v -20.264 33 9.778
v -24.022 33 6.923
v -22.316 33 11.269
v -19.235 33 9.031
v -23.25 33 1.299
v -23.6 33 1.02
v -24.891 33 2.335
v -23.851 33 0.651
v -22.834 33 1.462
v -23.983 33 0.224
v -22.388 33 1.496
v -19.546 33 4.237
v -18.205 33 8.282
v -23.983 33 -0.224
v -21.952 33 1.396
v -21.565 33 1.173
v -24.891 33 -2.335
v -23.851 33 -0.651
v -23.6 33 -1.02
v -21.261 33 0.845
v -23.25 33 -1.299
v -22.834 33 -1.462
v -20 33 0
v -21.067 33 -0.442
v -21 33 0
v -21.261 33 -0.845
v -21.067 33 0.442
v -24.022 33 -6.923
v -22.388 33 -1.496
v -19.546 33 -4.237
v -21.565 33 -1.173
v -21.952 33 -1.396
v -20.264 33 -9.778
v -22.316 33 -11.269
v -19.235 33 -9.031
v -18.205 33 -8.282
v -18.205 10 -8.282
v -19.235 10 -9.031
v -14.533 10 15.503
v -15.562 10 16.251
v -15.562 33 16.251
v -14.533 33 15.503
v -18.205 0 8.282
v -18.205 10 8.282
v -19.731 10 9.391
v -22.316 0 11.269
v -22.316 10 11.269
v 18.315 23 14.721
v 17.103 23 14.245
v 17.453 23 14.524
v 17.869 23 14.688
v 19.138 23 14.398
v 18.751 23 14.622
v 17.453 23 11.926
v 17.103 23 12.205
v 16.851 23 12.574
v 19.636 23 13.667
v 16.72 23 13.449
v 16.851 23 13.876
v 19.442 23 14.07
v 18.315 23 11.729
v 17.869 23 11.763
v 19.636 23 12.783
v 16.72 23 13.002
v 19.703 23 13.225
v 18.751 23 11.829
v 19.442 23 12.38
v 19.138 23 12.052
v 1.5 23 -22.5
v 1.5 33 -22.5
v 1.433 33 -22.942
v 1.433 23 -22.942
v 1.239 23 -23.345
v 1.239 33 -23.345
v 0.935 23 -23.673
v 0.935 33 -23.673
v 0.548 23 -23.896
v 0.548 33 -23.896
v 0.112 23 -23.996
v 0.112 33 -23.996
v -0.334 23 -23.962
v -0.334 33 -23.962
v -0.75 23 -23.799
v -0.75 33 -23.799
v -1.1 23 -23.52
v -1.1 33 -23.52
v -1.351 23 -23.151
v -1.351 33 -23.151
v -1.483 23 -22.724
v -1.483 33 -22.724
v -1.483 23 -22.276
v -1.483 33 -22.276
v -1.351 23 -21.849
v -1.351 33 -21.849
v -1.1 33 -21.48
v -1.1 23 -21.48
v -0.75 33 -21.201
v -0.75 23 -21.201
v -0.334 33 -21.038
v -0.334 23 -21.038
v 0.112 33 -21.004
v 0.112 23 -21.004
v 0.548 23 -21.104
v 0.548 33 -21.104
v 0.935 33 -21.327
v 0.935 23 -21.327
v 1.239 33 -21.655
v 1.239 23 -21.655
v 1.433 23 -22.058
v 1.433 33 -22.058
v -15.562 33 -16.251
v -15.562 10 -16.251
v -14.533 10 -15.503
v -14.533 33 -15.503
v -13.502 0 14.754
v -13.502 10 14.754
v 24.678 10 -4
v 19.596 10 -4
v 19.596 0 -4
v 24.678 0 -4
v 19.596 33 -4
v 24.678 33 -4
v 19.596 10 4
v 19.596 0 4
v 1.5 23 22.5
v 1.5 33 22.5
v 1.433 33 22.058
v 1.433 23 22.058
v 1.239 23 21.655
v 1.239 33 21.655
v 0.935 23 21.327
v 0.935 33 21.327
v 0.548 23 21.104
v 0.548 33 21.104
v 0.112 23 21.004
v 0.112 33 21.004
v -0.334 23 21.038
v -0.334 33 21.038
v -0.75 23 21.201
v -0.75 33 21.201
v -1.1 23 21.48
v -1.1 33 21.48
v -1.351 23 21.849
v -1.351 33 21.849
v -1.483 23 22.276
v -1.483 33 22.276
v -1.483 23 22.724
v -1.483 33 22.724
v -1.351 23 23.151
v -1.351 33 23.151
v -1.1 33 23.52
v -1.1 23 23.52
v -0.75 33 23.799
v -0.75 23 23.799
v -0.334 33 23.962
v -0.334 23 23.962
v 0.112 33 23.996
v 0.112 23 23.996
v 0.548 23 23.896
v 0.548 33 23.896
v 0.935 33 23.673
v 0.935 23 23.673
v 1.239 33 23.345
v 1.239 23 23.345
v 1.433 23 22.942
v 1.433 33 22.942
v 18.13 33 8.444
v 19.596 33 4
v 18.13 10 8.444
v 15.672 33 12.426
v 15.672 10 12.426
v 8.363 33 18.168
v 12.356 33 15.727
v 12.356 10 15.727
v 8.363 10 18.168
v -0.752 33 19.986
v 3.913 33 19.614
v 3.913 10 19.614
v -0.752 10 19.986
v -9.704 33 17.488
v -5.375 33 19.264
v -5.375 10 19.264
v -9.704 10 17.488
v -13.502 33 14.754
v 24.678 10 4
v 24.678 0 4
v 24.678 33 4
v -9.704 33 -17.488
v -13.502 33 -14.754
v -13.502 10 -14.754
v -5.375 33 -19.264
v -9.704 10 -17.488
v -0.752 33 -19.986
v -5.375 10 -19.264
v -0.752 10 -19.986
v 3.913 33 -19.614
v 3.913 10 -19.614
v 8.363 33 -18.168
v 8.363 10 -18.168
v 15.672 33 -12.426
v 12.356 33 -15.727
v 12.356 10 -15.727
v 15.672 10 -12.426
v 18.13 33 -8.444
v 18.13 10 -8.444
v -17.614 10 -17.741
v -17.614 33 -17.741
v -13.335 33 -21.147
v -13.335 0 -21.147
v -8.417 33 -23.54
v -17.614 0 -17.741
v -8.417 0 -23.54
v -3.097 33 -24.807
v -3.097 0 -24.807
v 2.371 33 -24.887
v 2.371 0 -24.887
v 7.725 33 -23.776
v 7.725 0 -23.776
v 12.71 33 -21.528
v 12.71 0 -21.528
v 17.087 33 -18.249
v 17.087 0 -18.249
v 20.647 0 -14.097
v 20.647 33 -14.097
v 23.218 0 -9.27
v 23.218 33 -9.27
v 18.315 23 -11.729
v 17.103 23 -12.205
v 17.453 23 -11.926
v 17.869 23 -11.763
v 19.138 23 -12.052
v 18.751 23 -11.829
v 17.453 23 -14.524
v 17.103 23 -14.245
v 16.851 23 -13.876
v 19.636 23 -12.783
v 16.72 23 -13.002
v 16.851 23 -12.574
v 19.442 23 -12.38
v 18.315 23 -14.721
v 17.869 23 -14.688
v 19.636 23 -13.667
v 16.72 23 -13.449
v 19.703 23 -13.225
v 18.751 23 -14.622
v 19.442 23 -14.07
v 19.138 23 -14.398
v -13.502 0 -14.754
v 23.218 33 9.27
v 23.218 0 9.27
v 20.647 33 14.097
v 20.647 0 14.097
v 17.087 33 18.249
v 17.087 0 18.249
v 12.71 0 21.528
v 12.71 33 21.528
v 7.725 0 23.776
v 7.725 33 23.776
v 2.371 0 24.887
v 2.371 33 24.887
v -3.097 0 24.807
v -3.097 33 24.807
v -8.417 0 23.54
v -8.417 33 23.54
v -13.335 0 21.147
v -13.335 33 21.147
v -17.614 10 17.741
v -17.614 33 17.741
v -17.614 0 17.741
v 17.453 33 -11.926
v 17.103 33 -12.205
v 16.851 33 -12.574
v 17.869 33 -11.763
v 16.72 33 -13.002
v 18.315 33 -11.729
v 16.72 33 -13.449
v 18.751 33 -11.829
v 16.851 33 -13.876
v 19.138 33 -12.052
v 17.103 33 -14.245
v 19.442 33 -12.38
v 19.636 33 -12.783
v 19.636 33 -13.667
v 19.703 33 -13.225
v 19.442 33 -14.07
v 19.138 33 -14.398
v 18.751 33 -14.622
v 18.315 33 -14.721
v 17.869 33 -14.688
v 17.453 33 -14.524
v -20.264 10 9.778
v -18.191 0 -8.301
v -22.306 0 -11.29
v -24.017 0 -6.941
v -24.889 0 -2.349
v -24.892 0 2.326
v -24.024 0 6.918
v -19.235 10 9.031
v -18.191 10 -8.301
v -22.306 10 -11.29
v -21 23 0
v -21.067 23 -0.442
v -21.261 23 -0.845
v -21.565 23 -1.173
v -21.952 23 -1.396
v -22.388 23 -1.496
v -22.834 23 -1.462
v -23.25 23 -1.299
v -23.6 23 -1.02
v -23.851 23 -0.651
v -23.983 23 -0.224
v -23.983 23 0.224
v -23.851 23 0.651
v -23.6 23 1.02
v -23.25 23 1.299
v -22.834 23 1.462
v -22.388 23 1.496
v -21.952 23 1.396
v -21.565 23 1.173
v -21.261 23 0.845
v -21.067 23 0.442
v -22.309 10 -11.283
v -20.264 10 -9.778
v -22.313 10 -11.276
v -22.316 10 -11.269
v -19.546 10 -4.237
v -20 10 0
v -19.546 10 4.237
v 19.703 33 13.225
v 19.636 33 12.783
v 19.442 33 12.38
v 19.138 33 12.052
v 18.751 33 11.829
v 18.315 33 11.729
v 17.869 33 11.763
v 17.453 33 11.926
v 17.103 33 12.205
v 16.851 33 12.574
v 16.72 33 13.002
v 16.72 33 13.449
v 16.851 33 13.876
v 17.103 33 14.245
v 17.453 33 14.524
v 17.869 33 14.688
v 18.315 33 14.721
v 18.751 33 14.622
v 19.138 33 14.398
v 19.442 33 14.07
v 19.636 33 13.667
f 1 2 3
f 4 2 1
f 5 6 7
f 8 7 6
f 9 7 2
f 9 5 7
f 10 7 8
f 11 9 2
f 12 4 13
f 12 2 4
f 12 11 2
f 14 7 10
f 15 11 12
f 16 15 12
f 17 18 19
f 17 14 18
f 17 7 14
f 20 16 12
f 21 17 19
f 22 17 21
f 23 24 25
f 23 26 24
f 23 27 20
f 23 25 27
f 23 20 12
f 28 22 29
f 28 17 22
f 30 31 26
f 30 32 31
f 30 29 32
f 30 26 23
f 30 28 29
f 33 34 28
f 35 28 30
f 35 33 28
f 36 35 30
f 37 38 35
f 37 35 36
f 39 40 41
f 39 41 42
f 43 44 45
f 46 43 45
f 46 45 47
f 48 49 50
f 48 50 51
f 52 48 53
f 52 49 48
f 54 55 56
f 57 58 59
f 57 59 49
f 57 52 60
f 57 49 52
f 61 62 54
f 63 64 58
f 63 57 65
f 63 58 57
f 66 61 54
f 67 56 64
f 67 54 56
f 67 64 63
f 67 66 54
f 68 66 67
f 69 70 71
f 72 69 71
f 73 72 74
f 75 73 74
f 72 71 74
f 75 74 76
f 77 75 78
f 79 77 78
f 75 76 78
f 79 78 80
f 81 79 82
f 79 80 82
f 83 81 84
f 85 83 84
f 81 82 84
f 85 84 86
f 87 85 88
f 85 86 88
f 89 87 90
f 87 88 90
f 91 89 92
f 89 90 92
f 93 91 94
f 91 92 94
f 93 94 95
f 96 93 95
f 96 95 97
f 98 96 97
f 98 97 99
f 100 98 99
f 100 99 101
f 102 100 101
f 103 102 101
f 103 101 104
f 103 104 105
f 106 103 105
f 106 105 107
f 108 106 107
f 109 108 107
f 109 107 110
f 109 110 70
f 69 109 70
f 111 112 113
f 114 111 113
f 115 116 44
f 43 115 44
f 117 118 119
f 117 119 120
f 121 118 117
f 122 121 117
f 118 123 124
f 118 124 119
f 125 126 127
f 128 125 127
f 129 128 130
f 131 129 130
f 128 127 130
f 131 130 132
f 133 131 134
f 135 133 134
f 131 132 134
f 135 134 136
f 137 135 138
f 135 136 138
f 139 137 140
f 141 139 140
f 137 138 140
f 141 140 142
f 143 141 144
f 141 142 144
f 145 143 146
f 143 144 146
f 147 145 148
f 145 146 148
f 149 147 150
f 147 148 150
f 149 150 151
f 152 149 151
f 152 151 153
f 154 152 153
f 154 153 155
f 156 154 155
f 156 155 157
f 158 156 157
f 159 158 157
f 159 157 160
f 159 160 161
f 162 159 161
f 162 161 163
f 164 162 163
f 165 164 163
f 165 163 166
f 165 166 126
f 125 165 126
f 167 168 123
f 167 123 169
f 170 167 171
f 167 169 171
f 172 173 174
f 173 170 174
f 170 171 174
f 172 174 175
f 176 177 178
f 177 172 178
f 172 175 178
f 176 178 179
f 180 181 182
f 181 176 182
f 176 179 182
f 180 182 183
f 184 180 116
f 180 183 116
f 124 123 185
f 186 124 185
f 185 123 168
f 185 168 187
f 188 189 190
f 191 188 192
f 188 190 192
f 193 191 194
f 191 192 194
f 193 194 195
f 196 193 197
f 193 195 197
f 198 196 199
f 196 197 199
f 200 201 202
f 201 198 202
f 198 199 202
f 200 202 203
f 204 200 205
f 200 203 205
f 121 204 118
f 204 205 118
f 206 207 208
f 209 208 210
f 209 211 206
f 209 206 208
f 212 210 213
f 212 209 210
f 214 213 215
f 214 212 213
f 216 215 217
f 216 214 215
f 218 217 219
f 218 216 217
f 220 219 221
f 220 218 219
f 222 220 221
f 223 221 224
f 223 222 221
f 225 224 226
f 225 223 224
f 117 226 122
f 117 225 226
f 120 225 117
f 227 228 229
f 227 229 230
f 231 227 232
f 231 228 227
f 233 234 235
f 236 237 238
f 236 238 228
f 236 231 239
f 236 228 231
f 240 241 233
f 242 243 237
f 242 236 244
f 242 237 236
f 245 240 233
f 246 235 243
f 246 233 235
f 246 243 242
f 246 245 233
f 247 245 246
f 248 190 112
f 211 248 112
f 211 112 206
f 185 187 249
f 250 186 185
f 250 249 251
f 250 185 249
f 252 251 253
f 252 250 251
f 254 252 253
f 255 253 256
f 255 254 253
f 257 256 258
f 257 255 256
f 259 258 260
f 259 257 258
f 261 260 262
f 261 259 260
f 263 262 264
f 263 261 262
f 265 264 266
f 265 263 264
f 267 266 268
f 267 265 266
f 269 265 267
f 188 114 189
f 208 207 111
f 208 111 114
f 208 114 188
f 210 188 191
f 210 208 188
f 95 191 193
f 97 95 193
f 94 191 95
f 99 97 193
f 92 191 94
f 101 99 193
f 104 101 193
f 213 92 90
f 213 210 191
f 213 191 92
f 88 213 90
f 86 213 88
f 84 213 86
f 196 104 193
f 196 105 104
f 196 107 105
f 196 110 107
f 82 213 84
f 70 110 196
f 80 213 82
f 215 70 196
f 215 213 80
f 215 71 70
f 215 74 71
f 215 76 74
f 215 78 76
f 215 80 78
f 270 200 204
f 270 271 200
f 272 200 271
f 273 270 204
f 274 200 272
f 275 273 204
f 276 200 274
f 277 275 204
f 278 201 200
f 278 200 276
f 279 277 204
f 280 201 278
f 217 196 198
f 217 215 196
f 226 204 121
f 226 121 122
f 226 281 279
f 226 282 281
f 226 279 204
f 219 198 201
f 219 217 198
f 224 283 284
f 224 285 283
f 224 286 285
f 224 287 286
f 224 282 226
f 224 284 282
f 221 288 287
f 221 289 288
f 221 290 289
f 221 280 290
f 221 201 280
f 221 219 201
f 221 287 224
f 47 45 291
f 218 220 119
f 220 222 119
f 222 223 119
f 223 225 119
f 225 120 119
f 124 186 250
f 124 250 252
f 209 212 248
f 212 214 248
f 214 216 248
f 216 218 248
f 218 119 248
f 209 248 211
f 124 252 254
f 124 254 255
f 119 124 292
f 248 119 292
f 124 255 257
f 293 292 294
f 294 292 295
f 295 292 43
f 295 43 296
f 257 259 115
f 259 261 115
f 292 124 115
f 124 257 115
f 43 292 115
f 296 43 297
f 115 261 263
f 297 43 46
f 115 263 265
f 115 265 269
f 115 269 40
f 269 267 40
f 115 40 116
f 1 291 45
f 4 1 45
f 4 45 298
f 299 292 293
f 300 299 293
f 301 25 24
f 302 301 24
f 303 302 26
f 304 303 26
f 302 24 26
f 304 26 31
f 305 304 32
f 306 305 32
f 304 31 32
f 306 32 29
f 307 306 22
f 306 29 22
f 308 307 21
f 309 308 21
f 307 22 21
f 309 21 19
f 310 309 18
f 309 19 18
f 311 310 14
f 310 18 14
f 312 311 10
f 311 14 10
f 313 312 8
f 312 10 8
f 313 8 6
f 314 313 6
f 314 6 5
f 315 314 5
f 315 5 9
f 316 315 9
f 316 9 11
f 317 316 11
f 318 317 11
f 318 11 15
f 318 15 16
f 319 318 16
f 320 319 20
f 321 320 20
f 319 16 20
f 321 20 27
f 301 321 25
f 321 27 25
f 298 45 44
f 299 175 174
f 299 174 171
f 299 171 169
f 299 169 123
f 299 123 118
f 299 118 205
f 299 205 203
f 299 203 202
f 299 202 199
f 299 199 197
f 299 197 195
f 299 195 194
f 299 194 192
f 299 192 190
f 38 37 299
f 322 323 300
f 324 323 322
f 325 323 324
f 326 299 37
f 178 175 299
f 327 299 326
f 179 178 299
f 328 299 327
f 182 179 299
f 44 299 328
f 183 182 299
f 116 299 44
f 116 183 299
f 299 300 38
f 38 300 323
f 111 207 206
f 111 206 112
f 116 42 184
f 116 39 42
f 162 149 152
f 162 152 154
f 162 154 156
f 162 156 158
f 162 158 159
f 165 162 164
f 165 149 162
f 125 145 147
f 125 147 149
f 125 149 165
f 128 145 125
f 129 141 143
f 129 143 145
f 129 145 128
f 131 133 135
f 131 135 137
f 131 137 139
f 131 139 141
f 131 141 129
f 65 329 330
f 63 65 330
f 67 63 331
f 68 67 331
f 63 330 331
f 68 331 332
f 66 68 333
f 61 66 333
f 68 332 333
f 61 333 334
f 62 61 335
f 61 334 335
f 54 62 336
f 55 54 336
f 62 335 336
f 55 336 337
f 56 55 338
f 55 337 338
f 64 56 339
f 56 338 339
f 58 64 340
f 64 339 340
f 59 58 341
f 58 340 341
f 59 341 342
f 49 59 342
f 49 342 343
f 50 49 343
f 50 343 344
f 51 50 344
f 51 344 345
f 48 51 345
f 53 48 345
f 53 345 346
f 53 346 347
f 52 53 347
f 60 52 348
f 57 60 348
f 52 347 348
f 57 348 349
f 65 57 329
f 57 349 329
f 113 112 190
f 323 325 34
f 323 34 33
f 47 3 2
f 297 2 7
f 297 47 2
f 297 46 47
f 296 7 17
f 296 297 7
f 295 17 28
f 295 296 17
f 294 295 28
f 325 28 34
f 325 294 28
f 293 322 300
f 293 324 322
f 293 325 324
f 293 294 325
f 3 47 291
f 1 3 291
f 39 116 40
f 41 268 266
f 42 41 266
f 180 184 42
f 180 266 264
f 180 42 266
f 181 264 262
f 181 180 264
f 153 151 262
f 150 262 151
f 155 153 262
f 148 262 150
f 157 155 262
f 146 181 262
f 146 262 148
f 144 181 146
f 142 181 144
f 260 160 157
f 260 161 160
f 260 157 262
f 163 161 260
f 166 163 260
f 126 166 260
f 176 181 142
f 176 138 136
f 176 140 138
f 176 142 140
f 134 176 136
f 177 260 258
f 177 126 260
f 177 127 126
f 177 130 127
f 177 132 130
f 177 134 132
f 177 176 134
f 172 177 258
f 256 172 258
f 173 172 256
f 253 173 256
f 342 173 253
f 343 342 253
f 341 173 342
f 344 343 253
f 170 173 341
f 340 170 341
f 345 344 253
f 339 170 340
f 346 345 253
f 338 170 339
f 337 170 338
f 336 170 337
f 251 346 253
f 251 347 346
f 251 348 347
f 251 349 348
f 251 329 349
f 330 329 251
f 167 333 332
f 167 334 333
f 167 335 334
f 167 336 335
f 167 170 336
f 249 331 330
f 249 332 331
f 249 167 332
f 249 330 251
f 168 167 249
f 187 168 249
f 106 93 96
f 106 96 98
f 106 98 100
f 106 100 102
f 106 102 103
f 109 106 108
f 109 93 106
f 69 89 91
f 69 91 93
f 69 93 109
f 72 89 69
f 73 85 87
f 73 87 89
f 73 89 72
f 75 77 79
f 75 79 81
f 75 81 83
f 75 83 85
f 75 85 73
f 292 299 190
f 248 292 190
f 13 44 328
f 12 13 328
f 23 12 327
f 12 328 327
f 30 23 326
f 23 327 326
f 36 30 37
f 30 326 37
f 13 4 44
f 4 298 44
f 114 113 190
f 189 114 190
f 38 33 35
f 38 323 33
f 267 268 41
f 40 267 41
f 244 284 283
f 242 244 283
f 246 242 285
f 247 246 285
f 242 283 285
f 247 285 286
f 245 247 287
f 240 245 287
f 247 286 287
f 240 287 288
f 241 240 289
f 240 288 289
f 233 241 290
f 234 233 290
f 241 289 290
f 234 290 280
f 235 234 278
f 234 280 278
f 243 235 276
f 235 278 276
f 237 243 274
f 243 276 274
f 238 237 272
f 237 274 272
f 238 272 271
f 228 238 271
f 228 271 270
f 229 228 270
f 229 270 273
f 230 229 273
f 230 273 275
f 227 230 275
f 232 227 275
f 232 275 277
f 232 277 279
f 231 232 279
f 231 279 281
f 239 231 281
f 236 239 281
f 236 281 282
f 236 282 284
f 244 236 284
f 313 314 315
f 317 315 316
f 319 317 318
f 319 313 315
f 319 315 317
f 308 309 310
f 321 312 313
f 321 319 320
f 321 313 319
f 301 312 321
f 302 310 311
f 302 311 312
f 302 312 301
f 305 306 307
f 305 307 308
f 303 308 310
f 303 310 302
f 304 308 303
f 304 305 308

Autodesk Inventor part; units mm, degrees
ref_plane "YZ Plane" through (0, 0, 0) normal (1, 0, 0) x (0, 1, 0)
ref_plane "XZ Plane" through (0, 0, 0) normal (0, 1, 0) x (-1, 0, 0)
ref_plane "XY Plane" through (0, 0, 0) normal (0, 0, 1) x (1, 0, 0)
sketch "Sketch1" plane through (0, 0, 0) normal (0, 1, 0) x (-1, 0, 0)
  line L0 (0, 0) -> (50, 0) construction
  line L1 (0, 0) -> (50, 0) construction
  line L2 (34.573, 37.4794) -> (12.6591, 21.558)
  line L3 (46.3287, 21.2991) -> (24.4148, 5.3777)
  line L4 (46.3287, -21.2991) -> (24.4148, -5.3777)
  line L5 (34.573, -37.4794) -> (12.6591, -21.558)
  line L6 (-50, -10) -> (-22.9129, -10)
  line L7 (56.6312, -41.145) -> (50.7533, -49.2351)
  line L8 (50.7533, -49.2351) -> (62.509, -33.0548)
  line L9 (62.509, -33.0548) -> (46.3287, -21.2991)
  line L10 (50.7533, -49.2351) -> (34.573, -37.4794)
  line L11 (46.3287, 21.2991) -> (62.509, 33.0548)
  line L12 (62.509, 33.0548) -> (50.7533, 49.2351)
  line L13 (50.7533, 49.2351) -> (34.573, 37.4794)
  line L14 (-50, 10) -> (-70, 10)
  line L15 (-70, 10) -> (-70, -10)
  line L16 (-70, -10) -> (-50, -10)
  line L17 (0, 0) -> (-36, 0)
  circle A0 centre (0, 0) radius 25
  line L18 (-22.9129, 10) -> (-50, 10)
  dimension "d52" = 10
  dimension "d53" = 20
  dimension "d67" = 36
  dimension "d68" = 50
extrude "Extrusion1" add sketch "Sketch1" along normal blind 10
sketch "Sketch8" plane through (-62.509, 0, -33.0548) normal (-0.809, 0, -0.5878) x (-0.5878, 0, 0.809)
  line L0 (-10, 3) -> (-14, 3)
  line L1 (-17, 3) -> (-14, 3)
  line L2 (-3, 3) -> (-3, 7)
  line L3 (-3, 7) -> (-6, 7)
  line L4 (-17, 7) -> (-17, 3)
  line L5 (-10, 0) -> (-6, 0)
  line L6 (14.8816, 0) -> (-15.3777, 0) projected
  line L7 (-6, 0) -> (-6, 3)
  line L8 (-6, 7) -> (-6, 10)
  line L9 (14.8816, 10) -> (-15.3777, 10) projected
  line L10 (-6, 10) -> (-14, 10)
  line L11 (-14, 10) -> (-14, 7)
  line L12 (-14, 3) -> (-14, 0)
  line L13 (-14, 3) -> (-17, 3)
  line L14 (-6, 3) -> (-3, 3)
  line L15 (-14, 7) -> (-17, 7)
  point P0 (-14, 10)
  point P1 (-14, 0)
  dimension "d85" = 3
  dimension "d86" = 7
  dimension "d87" = 14
  dimension "d88" = 4
  dimension "d89" = 4
  dimension "d90" = 8
extrude "Extrusion7" cut sketch "Sketch8" against normal blind 38
sketch "Sketch9" plane through (-50.7533, 0, 49.2351) normal (-0.809, 0, 0.5878) x (0.5878, 0, 0.809)
  line L0 (-10, 3) -> (-14, 3)
  line L1 (-17, 3) -> (-14, 3)
  line L2 (-3, 3) -> (-3, 7)
  line L3 (-3, 7) -> (-6, 7)
  line L4 (-17, 7) -> (-17, 3)
  line L5 (-10, 0) -> (-6, 0)
  line L6 (-6, 0) -> (-6, 3)
  line L7 (-6, 7) -> (-6, 10)
  line L8 (-6, 10) -> (-14, 10)
  line L9 (-14, 10) -> (-14, 7)
  line L10 (-14, 3) -> (-14, 0)
  line L11 (-14, 3) -> (-17, 3)
  line L12 (-6, 3) -> (-3, 3)
  line L13 (-14, 7) -> (-17, 7)
  line L14 (-14, 0) -> (-6, 0)
  line L15 (-6, 3) -> (-3, 3)
  line L16 (-3, 7) -> (-6, 7)
  line L17 (-6, 10) -> (-14, 10)
  line L18 (-4.6223, 10) -> (-34.8816, 10) projected
  line L19 (-14, 10) -> (-14, 7)
  line L20 (-17, 7) -> (-14, 7)
  line L21 (-17, 7) -> (-17, 3)
  line L22 (-14, 3) -> (-17, 3)
  line L23 (-14, 3) -> (-14, 0)
  line L24 (-4.6223, 0) -> (-34.8816, 0) projected
  line L25 (-3, 3) -> (-3, 7)
  line L26 (-6, 7) -> (-6, 10)
  line L27 (-6, 3) -> (-6, 0)
  point P0 (-10, 0)
  point P1 (-15.3777, 0)
  point P2 (-15.3777, 10)
  point P3 (-10, 0)
  dimension "d93" = 3
  dimension "d94" = 7
  dimension "d95" = 14
  dimension "d96" = 4
  dimension "d97" = 4
  dimension "d98" = 8
extrude "Extrusion8" cut sketch "Sketch9" against normal blind 38
sketch "Sketch10" plane through (70, 0, 10) normal (1, 0, 0) x (0, 0, -1)
  line L0 (10, 0) -> (10, 3)
  line L1 (10, 3) -> (17, 3)
  line L2 (17, 3) -> (3, 3)
  line L3 (3, 3) -> (6, 3)
  line L4 (6, 3) -> (6, 0)
  line L5 (0, 0) -> (20, 0) projected
  line L6 (6, 0) -> (14, 0)
  line L7 (14, 0) -> (14, 3)
  line L8 (17, 3) -> (17, 7)
  line L9 (17, 7) -> (3, 7)
  line L10 (3, 7) -> (3, 3)
  line L11 (14, 7) -> (14, 10)
  line L12 (0, 10) -> (20, 10) projected
  line L13 (6, 10) -> (14, 10)
  line L14 (6, 10) -> (6, 7)
  dimension "d101" = 3
  dimension "d102" = 7
  dimension "d103" = 14
  dimension "d104" = 3
  dimension "d105" = 8
  dimension "d106" = 4
extrude "Extrusion9" cut sketch "Sketch10" against normal blind 38
sketch "Sketch12" plane through (70, 0, 10) normal (1, 0, 0) x (0, 0, -1)
  line L0 (20, 10) -> (0, 10) projected
  line L1 (43.0548, 0) -> (15.3777, 0) projected
  line L2 (0, 10) -> (20, 10)
  line L3 (20, 10) -> (20, 0)
  line L4 (20, 0) -> (0, 0)
  line L5 (0, 0) -> (0, 10)
  line L6 (0, 10) -> (2.5, 10)
  circle A0 centre (2.5, 8.5) radius 0.5
  circle A1 centre (2.5, 1.5) radius 0.5
  circle A2 centre (17.5, 1.5) radius 0.5
  circle A3 centre (17.5, 8.5) radius 0.5
  point P0 (10, 0)
  point P1 (16.8377, 0)
  point P2 (16.8377, 0)
  dimension "d119" = 20
  dimension "d120" = 2.5
  dimension "d123" = 1
  dimension "d126" = 1
  dimension "d127" = 1
  dimension "d128" = 1
extrude "Extrusion14" cut sketch "Sketch12" against normal blind 10
extrude "Extrusion15" cut sketch "Sketch12" against normal blind 14 contours A0 | A1 | A2 | A3
sketch "Sketch13" plane through (-50.7533, 0, -49.2351) normal (-0.809, 0, -0.5878) x (-0.5878, 0, 0.809)
  line L0 (20, 10) -> (0, 10)
  line L1 (0, 10) -> (20, 10)
  line L2 (20, 10) -> (20, 0)
  line L3 (20, 0) -> (0, 0)
  line L4 (0, 0) -> (0, 10)
  line L5 (0, 10) -> (2.5, 10)
  circle A0 centre (2.5, 8.5) radius 0.5
  circle A1 centre (2.5, 1.5) radius 0.5
  circle A2 centre (17.5, 1.5) radius 0.5
  circle A3 centre (17.5, 8.5) radius 0.5
  point P0 (10, 0)
  point P1 (10, 0)
  point P2 (16.8377, 0)
  point P3 (20, 10)
  dimension "d133" = 20
  dimension "d134" = 2.5
  dimension "d135" = 1
  dimension "d136" = 1
  dimension "d137" = 1
  dimension "d138" = 1
extrude "Extrusion16" cut sketch "Sketch13" against normal blind 10
extrude "Extrusion17" cut sketch "Sketch13" against normal blind 14 contours A0 | A1 | A2 | A3
sketch "Sketch14" plane through (-62.509, 0, 33.0548) normal (-0.809, 0, 0.5878) x (0.5878, 0, 0.809)
  line L0 (20, 10) -> (0, 10)
  line L1 (0, 10) -> (20, 10)
  line L2 (20, 10) -> (20, 0)
  line L3 (20, 0) -> (0, 0)
  line L4 (0, 0) -> (0, 10)
  line L5 (0, 10) -> (2.5, 10)
  circle A0 centre (2.5, 8.5) radius 0.5
  circle A1 centre (2.5, 1.5) radius 0.5
  circle A2 centre (17.5, 1.5) radius 0.5
  circle A3 centre (17.5, 8.5) radius 0.5
  point P0 (10, 0)
  point P1 (10, 0)
  point P2 (10, 0)
  point P3 (16.8377, 0)
  point P4 (20, 10)
  point P5 (20, 10)
  dimension "d143" = 20
  dimension "d144" = 2.5
  dimension "d145" = 1
  dimension "d146" = 1
  dimension "d147" = 1
  dimension "d148" = 1
extrude "Extrusion18" cut sketch "Sketch14" against normal blind 10
extrude "Extrusion19" cut sketch "Sketch14" against normal blind 14 contours A0 | A1 | A2 | A3
sketch "Sketch30" plane through (0, 10, 0) normal (0, 1, 0) x (1, 0, 0)
  line L0 (44, -4) -> (45, -4)
  line L1 (44, -4) -> (52, -4)
  line L2 (52, -4) -> (52, -10)
  line L3 (52, -10) -> (44, -10)
  line L4 (44, -10) -> (44, -4)
  line L5 (33.5, 4) -> (41.5, 4)
  line L6 (41.5, 4) -> (41.5, 10)
  line L7 (41.5, 10) -> (33.5, 10)
  line L8 (33.5, 10) -> (33.5, 4)
  line L9 (-24.7509, -22.9269) -> (-31.2231, -27.6292)
  line L10 (-31.2231, -27.6292) -> (-27.6611, -32.4577)
  line L11 (-27.6611, -32.4577) -> (-21.189, -27.7554)
  line L12 (-21.189, -27.7554) -> (-24.7509, -22.9269)
  line L13 (-50.8922, -32.031) -> (-28.2397, -15.5731) projected
  line L14 (-37.9479, -22.6265) -> (-44.42, -27.3288)
  line L15 (-44.42, -27.3288) -> (-47.9467, -22.4747)
  line L16 (-24.4148, -5.3777) -> (-54.4189, -27.1769) projected
  line L17 (-47.9467, -22.4747) -> (-41.4746, -17.7724)
  line L18 (-41.4746, -17.7724) -> (-37.9479, -22.6265)
  line L19 (-28.2397, 15.5731) -> (-50.8922, 32.031) projected
  line L20 (-50.8922, 32.031) -> (-28.2397, 15.5731) projected
  line L21 (-28.2397, 15.5731) -> (-29.4532, 16.4547)
  line L22 (-29.4532, 16.4547) -> (-32.9799, 11.6006)
  line L23 (-54.4189, 27.1769) -> (-24.4148, 5.3777) projected
  line L24 (-29.4532, 16.4547) -> (-35.9253, 21.157)
  line L25 (-35.9253, 21.157) -> (-39.4521, 16.3029)
  line L26 (-39.4521, 16.3029) -> (-32.9799, 11.6006)
  line L27 (-46.1899, 38.5032) -> (-23.5374, 22.0452) projected
  line L28 (-33.2456, 29.0986) -> (-39.7177, 33.8009)
  line L29 (-39.7177, 33.8009) -> (-36.191, 38.655)
  line L30 (-12.6591, 21.558) -> (-42.6632, 43.3573) projected
  line L31 (-33.2456, 29.0986) -> (-29.7189, 33.9527)
  line L32 (-46.1899, 38.5032) -> (-23.5374, 22.0452) projected
  line L33 (-29.7189, 33.9527) -> (-36.191, 38.655)
  point P0 (0, 0)
  point P1 (32, 4)
  point P2 (42, 10)
  point P3 (34, 10)
  point P4 (41, 10)
  point P5 (-23.5374, -22.0452)
  dimension "d249" = 1
  dimension "d251" = 8
  dimension "d258" = 8
  dimension "d268" = 8
  dimension "d269" = 1.5
  dimension "d270" = 8
  dimension "d271" = 8
  dimension "d278" = 12
  dimension "d279" = 8
  dimension "d282" = 1.5
  dimension "d283" = 8
  dimension "d284" = 12
  dimension "d285" = 8
extrude "Extrusion35" add sketch "Sketch30" along normal blind 35
sketch "Sketch31" plane through (22.9129, 0, -10) normal (0, 0, -1) x (-1, 0, 0)
  line L0 (-9.0871, 45) -> (-19.0871, 45) projected
  circle A0 centre (-14.5871, 28.5) radius 1.5
  point P0 (22.9129, 0)
  dimension "d264" = 3
extrude "Extrusion36" cut sketch "Sketch31" against normal up to next
sketch "Sketch32" plane through (32, 7, 4) normal (0, 0, -1) x (-1, 0, 0)
  line L0 (-20, 38) -> (-12, 38) projected
  line L1 (-16, 38) -> (-16, 33)
  circle A0 centre (-16, 33) radius 1.5
  point P0 (32, -7)
  dimension "d253" = 5
  dimension "d254" = 3
extrude "Extrusion37" cut sketch "Sketch32" against normal up to next
sketch "Sketch33" plane through (-23.5374, 7, 22.0452) normal (-0.5878, 0, -0.809) x (-0.809, 0, 0.5878)
  line L0 (9.4564, 38) -> (1.4564, 38) projected
  line L1 (5.4564, 38) -> (5.4564, 21.5)
  circle A0 centre (5.4564, 21.5) radius 1.5
  point P0 (-32, -7)
  dimension "d286" = 16.5
  dimension "d287" = 3
sketch "Sketch34" plane through (-24.4148, 0, 5.3777) normal (-0.5878, 0, -0.809) x (-0.809, 0, 0.5878)
  line L0 (29.0871, 45) -> (21.0871, 45) projected
  line L1 (25.0871, 45) -> (25.0871, 40)
  circle A0 centre (25.0871, 40) radius 1.5
  point P0 (-22.9129, 0)
  dimension "d288" = 5
  dimension "d289" = 3
sketch "Sketch35" plane through (-28.2397, 7, -15.5731) normal (0.5878, 0, -0.809) x (-0.809, 0, -0.5878)
  line L0 (1.5, 38) -> (9.5, 38) projected
  line L1 (5.5, 38) -> (5.5, 21.5)
  circle A0 centre (5.5, 21.5) radius 1.5
  point P0 (-32, -7)
  dimension "d290" = 16.5
  dimension "d291" = 3
sketch "Sketch36" plane through (-12.6591, 0, -21.558) normal (0.5878, 0, -0.809) x (-0.809, 0, -0.5878)
  line L0 (29.0871, 45) -> (21.0871, 45) projected
  line L1 (25.0871, 45) -> (25.0871, 40)
  circle A0 centre (25.0871, 40) radius 1.5
  point P0 (-22.9129, 0)
  dimension "d292" = 5
  dimension "d293" = 3
extrude "Extrusion38" cut sketch "Sketch36" against normal up to next
extrude "Extrusion39" cut sketch "Sketch35" against normal up to next
extrude "Extrusion40" cut sketch "Sketch34" against normal up to next
extrude "Extrusion41" cut sketch "Sketch33" against normal up to next
sketch "Sketch37" plane through (0, 10, 0) normal (0, 1, 0) x (1, 0, 0)
  circle A0 centre (0, 0) radius 25
  circle A1 centre (0, 0) radius 22.5
  line L0 (-23.5374, 22.0452) -> (-15.5618, 16.2506)
  line L1 (-23.5374, 22.0452) -> (-13.679, 22.0452) construction
  line L2 (-50.8922, 32.031) -> (-28.2397, 15.5731) projected
  line L3 (-28.2397, 15.5731) -> (-20.2641, 9.7784)
  line L4 (-28.2397, -15.5731) -> (-20.2641, -9.7784)
  line L5 (-23.5374, -22.0452) -> (-15.5618, -16.2506)
  line L6 (60, 4) -> (32, 4) projected
  line L7 (32, 4) -> (22.1416, 4)
  line L8 (32, -4) -> (22.1416, -4)
  circle A2 centre (0, 0) radius 21.25
  line L9 (-20.2641, -9.7784) -> (-19.2354, -9.0311)
  line L10 (-15.5618, -16.2506) -> (-14.5332, -15.5032)
  line L11 (-20.2641, 9.7784) -> (-19.2354, 9.0311)
  line L12 (-15.5618, 16.2506) -> (-14.5332, 15.5032)
  line L13 (22.1416, 4) -> (20.8701, 4)
  line L14 (22.1416, -4) -> (20.8701, -4)
  circle A3 centre (0, 0) radius 22.5
  circle A4 centre (0, 0) radius 21.25
  circle A5 centre (0, 0) radius 20
  line L15 (-19.2354, 9.0311) -> (-18.2046, 8.2821)
  line L16 (-14.5332, 15.5032) -> (-13.5023, 14.7543)
  line L17 (20.8701, -4) -> (19.5959, -4)
  line L18 (20.8701, 4) -> (19.5959, 4)
  line L19 (-14.5332, -15.5032) -> (-13.5023, -14.7543)
  line L20 (-19.2354, -9.0311) -> (-18.2046, -8.2821)
  point P0 (24.6779, -4)
  point P1 (-17.6137, -17.7414)
  point P2 (-22.316, -11.2693)
  point P3 (-22.316, 11.2693)
  point P4 (24.6779, 4)
  point P5 (-17.6137, 17.7414)
  dimension "d302" = 45
  dimension "d303" = 36
  dimension "d306" = 42.5
  dimension "d315" = 45
  dimension "d316" = 42.5
  dimension "d317" = 40
extrude "Extrusion42" add sketch "Sketch37" along normal blind 23 contours L7 A1 L0 A0 | A0 L5 A1 L8 | L13 A2 L12 A1 | A1 L10 A2 L14 | L3 A1 L4 A0 | L18 A5 L16 A2 | A2 L19 A5 L17 | L11 A2 L9 A1 | L15 A5 L20 A2
sketch "Sketch38" plane through (0, 33, 0) normal (0, 1, 0) x (1, 0, 0)
  line L0 (22.1416, 4) -> (20.8701, 4)
  line L1 (22.1416, -4) -> (20.8701, -4)
  line L2 (24.6779, 4) -> (22.1416, 4)
  line L3 (24.6779, -4) -> (22.1416, -4)
  line L4 (-15.5618, -16.2506) -> (-14.5332, -15.5032)
  line L5 (-15.5618, 16.2506) -> (-14.5332, 15.5032)
  line L6 (-20.2641, -9.7784) -> (-19.2354, -9.0311)
  line L7 (-17.6137, -17.7414) -> (-15.5618, -16.2506)
  line L8 (-22.316, -11.2693) -> (-20.2641, -9.7784)
  line L9 (-20.2641, 9.7784) -> (-19.2354, 9.0311)
  line L10 (-17.6137, 17.7414) -> (-15.5618, 16.2506)
  line L11 (-22.316, 11.2693) -> (-20.2641, 9.7784)
  line L12 (-23.5374, 22.0452) -> (-13.679, 22.0452) construction
  arc A0 (-17.6137, -17.7414) -> (24.6779, -4) centre (0, 0) ccw
  arc A1 (24.6779, 4) -> (-17.6137, 17.7414) centre (0, 0) ccw
  arc A2 (-22.316, 11.2693) -> (-22.316, -11.2693) centre (0, 0) ccw
  line L13 (20.8701, 4) -> (15.8701, 4)
  line L14 (15.8701, 4) -> (15.8701, -4)
  line L15 (15.8701, -4) -> (20.8701, -4)
  line L16 (-14.5332, 15.5032) -> (-10.4881, 12.5643)
  line L17 (-10.4881, 12.5643) -> (-15.1903, 6.0922)
  line L18 (-15.1903, 6.0922) -> (-19.2354, 9.0311)
  line L19 (-19.2354, -9.0311) -> (-15.1903, -6.0922)
  line L20 (-15.1903, -6.0922) -> (-10.4881, -12.5643)
  line L21 (-10.4881, -12.5643) -> (-14.5332, -15.5032)
  circle A3 centre (-22.5, 0) radius 1.5
  circle A4 centre (0, 22.5) radius 1.5
  circle A5 centre (18.2029, 13.2252) radius 1.5
  circle A6 centre (18.2029, -13.2252) radius 1.5
  circle A7 centre (0, -22.5) radius 1.5
  point P0 (-23.5374, -22.0452)
  point P1 (-28.2397, -15.5731)
  dimension "d307" = 36
  dimension "d308" = 5
  dimension "d309" = 5
  dimension "d310" = 3
  dimension "d311" = 3
  dimension "d312" = 3
  dimension "d313" = 3
  dimension "d314" = 3
extrude "Extrusion43" cut sketch "Sketch38" against normal blind 10 contours A3 | A4 | A5 | A6 | A7
sketch "Sketch39" plane through (0, 45, 0) normal (0, 1, 0) x (1, 0, 0)
  line L0 (-37.9479, -22.6265) -> (-41.4746, -17.7724) projected
  line L1 (-47.9467, -22.4747) -> (-44.42, -27.3288) projected
  line L2 (-31.2231, -27.6292) -> (-27.6611, -32.4577) projected
  circle A0 centre (-42.9473, -22.5506) radius 1.5
  circle A1 centre (-26.2405, -27.6816) radius 1.5
  line L3 (-29.7189, 33.9527) -> (-36.191, 38.655) projected
  line L4 (-39.7177, 33.8009) -> (-33.2456, 29.0986) projected
  line L5 (-29.4532, 16.4547) -> (-35.9253, 21.157) projected
  line L6 (41.5, 10) -> (33.5, 10) projected
  line L7 (33.5, 4) -> (41.5, 4) projected
  line L8 (44, -10) -> (52, -10) projected
  circle A2 centre (48, -7) radius 1.5
  circle A3 centre (37.5, 7) radius 1.5
  circle A4 centre (-34.7183, 33.8768) radius 1.5
  circle A5 centre (-34.4526, 16.3788) radius 1.5
  point P0 (0, 0)
  point P1 (-32.9799, 11.6006)
  point P2 (44, -4)
  dimension "d320" = 3
  dimension "d321" = 3
  dimension "d322" = 3
  dimension "d323" = 3
  dimension "d325" = 3
extrude "Extrusion44" cut sketch "Sketch39" against normal blind 3
sketch "Sketch40" plane through (0, 33, 0) normal (0, 1, 0) x (1, 0, 0)
  circle A0 centre (0, 0) radius 82.7882
  circle A1 centre (0, 0) radius 25
  dimension "d331" = 50
extrude "Extrusion46" cut sketch "Sketch40" against normal through all both and the other way through all
sketch "Sketch42" plane through (0, 10, 0) normal (0, 1, 0) x (1, 0, 0)
  line L0 (-18.2046, -8.2821) -> (-22.316, -11.2693) projected
  line L1 (-13.5023, -14.7543) -> (-18.2046, -8.2821)
  line L2 (-13.5023, 14.7543) -> (-17.6137, 17.7414) projected
  line L3 (-18.1912, 8.3006) -> (-13.5023, 14.7543)
  arc A0 (-13.5023, -14.7543) -> (19.5959, -4) centre (0, 0) ccw projected
  arc A1 (19.5959, 4) -> (-13.5023, 14.7543) centre (0, 0) ccw projected
  line L4 (19.5959, -4) -> (19.5959, 4)
  circle A2 centre (0, 0) radius 25
  line L5 (-17.6137, -17.7414) -> (-13.5023, -14.7543) projected
  line L6 (-17.6137, -17.7414) -> (-13.5023, -14.7543)
  arc A3 (-22.316, -11.2693) -> (-17.6137, -17.7414) centre (0, 0) ccw projected
  line L7 (-22.316, -11.2693) -> (-18.2046, -8.2821)
  line L8 (-17.6137, 17.7414) -> (-13.5023, 14.7543)
  line L9 (-18.1912, 8.3006) -> (-22.3056, 11.2899)
  line L10 (19.5959, -4) -> (24.6779, -4) projected
  line L11 (19.5959, -4) -> (24.6779, -4)
  line L12 (19.5959, 4) -> (24.6779, 4)
  dimension "d334" = 50
extrude "Extrusion47" cut sketch "Sketch42" against normal through all contours L1 L5 A2 L0 | A2 L2 L3 L9 | L4 L12 A2 L10
properties part number "basePart1"
